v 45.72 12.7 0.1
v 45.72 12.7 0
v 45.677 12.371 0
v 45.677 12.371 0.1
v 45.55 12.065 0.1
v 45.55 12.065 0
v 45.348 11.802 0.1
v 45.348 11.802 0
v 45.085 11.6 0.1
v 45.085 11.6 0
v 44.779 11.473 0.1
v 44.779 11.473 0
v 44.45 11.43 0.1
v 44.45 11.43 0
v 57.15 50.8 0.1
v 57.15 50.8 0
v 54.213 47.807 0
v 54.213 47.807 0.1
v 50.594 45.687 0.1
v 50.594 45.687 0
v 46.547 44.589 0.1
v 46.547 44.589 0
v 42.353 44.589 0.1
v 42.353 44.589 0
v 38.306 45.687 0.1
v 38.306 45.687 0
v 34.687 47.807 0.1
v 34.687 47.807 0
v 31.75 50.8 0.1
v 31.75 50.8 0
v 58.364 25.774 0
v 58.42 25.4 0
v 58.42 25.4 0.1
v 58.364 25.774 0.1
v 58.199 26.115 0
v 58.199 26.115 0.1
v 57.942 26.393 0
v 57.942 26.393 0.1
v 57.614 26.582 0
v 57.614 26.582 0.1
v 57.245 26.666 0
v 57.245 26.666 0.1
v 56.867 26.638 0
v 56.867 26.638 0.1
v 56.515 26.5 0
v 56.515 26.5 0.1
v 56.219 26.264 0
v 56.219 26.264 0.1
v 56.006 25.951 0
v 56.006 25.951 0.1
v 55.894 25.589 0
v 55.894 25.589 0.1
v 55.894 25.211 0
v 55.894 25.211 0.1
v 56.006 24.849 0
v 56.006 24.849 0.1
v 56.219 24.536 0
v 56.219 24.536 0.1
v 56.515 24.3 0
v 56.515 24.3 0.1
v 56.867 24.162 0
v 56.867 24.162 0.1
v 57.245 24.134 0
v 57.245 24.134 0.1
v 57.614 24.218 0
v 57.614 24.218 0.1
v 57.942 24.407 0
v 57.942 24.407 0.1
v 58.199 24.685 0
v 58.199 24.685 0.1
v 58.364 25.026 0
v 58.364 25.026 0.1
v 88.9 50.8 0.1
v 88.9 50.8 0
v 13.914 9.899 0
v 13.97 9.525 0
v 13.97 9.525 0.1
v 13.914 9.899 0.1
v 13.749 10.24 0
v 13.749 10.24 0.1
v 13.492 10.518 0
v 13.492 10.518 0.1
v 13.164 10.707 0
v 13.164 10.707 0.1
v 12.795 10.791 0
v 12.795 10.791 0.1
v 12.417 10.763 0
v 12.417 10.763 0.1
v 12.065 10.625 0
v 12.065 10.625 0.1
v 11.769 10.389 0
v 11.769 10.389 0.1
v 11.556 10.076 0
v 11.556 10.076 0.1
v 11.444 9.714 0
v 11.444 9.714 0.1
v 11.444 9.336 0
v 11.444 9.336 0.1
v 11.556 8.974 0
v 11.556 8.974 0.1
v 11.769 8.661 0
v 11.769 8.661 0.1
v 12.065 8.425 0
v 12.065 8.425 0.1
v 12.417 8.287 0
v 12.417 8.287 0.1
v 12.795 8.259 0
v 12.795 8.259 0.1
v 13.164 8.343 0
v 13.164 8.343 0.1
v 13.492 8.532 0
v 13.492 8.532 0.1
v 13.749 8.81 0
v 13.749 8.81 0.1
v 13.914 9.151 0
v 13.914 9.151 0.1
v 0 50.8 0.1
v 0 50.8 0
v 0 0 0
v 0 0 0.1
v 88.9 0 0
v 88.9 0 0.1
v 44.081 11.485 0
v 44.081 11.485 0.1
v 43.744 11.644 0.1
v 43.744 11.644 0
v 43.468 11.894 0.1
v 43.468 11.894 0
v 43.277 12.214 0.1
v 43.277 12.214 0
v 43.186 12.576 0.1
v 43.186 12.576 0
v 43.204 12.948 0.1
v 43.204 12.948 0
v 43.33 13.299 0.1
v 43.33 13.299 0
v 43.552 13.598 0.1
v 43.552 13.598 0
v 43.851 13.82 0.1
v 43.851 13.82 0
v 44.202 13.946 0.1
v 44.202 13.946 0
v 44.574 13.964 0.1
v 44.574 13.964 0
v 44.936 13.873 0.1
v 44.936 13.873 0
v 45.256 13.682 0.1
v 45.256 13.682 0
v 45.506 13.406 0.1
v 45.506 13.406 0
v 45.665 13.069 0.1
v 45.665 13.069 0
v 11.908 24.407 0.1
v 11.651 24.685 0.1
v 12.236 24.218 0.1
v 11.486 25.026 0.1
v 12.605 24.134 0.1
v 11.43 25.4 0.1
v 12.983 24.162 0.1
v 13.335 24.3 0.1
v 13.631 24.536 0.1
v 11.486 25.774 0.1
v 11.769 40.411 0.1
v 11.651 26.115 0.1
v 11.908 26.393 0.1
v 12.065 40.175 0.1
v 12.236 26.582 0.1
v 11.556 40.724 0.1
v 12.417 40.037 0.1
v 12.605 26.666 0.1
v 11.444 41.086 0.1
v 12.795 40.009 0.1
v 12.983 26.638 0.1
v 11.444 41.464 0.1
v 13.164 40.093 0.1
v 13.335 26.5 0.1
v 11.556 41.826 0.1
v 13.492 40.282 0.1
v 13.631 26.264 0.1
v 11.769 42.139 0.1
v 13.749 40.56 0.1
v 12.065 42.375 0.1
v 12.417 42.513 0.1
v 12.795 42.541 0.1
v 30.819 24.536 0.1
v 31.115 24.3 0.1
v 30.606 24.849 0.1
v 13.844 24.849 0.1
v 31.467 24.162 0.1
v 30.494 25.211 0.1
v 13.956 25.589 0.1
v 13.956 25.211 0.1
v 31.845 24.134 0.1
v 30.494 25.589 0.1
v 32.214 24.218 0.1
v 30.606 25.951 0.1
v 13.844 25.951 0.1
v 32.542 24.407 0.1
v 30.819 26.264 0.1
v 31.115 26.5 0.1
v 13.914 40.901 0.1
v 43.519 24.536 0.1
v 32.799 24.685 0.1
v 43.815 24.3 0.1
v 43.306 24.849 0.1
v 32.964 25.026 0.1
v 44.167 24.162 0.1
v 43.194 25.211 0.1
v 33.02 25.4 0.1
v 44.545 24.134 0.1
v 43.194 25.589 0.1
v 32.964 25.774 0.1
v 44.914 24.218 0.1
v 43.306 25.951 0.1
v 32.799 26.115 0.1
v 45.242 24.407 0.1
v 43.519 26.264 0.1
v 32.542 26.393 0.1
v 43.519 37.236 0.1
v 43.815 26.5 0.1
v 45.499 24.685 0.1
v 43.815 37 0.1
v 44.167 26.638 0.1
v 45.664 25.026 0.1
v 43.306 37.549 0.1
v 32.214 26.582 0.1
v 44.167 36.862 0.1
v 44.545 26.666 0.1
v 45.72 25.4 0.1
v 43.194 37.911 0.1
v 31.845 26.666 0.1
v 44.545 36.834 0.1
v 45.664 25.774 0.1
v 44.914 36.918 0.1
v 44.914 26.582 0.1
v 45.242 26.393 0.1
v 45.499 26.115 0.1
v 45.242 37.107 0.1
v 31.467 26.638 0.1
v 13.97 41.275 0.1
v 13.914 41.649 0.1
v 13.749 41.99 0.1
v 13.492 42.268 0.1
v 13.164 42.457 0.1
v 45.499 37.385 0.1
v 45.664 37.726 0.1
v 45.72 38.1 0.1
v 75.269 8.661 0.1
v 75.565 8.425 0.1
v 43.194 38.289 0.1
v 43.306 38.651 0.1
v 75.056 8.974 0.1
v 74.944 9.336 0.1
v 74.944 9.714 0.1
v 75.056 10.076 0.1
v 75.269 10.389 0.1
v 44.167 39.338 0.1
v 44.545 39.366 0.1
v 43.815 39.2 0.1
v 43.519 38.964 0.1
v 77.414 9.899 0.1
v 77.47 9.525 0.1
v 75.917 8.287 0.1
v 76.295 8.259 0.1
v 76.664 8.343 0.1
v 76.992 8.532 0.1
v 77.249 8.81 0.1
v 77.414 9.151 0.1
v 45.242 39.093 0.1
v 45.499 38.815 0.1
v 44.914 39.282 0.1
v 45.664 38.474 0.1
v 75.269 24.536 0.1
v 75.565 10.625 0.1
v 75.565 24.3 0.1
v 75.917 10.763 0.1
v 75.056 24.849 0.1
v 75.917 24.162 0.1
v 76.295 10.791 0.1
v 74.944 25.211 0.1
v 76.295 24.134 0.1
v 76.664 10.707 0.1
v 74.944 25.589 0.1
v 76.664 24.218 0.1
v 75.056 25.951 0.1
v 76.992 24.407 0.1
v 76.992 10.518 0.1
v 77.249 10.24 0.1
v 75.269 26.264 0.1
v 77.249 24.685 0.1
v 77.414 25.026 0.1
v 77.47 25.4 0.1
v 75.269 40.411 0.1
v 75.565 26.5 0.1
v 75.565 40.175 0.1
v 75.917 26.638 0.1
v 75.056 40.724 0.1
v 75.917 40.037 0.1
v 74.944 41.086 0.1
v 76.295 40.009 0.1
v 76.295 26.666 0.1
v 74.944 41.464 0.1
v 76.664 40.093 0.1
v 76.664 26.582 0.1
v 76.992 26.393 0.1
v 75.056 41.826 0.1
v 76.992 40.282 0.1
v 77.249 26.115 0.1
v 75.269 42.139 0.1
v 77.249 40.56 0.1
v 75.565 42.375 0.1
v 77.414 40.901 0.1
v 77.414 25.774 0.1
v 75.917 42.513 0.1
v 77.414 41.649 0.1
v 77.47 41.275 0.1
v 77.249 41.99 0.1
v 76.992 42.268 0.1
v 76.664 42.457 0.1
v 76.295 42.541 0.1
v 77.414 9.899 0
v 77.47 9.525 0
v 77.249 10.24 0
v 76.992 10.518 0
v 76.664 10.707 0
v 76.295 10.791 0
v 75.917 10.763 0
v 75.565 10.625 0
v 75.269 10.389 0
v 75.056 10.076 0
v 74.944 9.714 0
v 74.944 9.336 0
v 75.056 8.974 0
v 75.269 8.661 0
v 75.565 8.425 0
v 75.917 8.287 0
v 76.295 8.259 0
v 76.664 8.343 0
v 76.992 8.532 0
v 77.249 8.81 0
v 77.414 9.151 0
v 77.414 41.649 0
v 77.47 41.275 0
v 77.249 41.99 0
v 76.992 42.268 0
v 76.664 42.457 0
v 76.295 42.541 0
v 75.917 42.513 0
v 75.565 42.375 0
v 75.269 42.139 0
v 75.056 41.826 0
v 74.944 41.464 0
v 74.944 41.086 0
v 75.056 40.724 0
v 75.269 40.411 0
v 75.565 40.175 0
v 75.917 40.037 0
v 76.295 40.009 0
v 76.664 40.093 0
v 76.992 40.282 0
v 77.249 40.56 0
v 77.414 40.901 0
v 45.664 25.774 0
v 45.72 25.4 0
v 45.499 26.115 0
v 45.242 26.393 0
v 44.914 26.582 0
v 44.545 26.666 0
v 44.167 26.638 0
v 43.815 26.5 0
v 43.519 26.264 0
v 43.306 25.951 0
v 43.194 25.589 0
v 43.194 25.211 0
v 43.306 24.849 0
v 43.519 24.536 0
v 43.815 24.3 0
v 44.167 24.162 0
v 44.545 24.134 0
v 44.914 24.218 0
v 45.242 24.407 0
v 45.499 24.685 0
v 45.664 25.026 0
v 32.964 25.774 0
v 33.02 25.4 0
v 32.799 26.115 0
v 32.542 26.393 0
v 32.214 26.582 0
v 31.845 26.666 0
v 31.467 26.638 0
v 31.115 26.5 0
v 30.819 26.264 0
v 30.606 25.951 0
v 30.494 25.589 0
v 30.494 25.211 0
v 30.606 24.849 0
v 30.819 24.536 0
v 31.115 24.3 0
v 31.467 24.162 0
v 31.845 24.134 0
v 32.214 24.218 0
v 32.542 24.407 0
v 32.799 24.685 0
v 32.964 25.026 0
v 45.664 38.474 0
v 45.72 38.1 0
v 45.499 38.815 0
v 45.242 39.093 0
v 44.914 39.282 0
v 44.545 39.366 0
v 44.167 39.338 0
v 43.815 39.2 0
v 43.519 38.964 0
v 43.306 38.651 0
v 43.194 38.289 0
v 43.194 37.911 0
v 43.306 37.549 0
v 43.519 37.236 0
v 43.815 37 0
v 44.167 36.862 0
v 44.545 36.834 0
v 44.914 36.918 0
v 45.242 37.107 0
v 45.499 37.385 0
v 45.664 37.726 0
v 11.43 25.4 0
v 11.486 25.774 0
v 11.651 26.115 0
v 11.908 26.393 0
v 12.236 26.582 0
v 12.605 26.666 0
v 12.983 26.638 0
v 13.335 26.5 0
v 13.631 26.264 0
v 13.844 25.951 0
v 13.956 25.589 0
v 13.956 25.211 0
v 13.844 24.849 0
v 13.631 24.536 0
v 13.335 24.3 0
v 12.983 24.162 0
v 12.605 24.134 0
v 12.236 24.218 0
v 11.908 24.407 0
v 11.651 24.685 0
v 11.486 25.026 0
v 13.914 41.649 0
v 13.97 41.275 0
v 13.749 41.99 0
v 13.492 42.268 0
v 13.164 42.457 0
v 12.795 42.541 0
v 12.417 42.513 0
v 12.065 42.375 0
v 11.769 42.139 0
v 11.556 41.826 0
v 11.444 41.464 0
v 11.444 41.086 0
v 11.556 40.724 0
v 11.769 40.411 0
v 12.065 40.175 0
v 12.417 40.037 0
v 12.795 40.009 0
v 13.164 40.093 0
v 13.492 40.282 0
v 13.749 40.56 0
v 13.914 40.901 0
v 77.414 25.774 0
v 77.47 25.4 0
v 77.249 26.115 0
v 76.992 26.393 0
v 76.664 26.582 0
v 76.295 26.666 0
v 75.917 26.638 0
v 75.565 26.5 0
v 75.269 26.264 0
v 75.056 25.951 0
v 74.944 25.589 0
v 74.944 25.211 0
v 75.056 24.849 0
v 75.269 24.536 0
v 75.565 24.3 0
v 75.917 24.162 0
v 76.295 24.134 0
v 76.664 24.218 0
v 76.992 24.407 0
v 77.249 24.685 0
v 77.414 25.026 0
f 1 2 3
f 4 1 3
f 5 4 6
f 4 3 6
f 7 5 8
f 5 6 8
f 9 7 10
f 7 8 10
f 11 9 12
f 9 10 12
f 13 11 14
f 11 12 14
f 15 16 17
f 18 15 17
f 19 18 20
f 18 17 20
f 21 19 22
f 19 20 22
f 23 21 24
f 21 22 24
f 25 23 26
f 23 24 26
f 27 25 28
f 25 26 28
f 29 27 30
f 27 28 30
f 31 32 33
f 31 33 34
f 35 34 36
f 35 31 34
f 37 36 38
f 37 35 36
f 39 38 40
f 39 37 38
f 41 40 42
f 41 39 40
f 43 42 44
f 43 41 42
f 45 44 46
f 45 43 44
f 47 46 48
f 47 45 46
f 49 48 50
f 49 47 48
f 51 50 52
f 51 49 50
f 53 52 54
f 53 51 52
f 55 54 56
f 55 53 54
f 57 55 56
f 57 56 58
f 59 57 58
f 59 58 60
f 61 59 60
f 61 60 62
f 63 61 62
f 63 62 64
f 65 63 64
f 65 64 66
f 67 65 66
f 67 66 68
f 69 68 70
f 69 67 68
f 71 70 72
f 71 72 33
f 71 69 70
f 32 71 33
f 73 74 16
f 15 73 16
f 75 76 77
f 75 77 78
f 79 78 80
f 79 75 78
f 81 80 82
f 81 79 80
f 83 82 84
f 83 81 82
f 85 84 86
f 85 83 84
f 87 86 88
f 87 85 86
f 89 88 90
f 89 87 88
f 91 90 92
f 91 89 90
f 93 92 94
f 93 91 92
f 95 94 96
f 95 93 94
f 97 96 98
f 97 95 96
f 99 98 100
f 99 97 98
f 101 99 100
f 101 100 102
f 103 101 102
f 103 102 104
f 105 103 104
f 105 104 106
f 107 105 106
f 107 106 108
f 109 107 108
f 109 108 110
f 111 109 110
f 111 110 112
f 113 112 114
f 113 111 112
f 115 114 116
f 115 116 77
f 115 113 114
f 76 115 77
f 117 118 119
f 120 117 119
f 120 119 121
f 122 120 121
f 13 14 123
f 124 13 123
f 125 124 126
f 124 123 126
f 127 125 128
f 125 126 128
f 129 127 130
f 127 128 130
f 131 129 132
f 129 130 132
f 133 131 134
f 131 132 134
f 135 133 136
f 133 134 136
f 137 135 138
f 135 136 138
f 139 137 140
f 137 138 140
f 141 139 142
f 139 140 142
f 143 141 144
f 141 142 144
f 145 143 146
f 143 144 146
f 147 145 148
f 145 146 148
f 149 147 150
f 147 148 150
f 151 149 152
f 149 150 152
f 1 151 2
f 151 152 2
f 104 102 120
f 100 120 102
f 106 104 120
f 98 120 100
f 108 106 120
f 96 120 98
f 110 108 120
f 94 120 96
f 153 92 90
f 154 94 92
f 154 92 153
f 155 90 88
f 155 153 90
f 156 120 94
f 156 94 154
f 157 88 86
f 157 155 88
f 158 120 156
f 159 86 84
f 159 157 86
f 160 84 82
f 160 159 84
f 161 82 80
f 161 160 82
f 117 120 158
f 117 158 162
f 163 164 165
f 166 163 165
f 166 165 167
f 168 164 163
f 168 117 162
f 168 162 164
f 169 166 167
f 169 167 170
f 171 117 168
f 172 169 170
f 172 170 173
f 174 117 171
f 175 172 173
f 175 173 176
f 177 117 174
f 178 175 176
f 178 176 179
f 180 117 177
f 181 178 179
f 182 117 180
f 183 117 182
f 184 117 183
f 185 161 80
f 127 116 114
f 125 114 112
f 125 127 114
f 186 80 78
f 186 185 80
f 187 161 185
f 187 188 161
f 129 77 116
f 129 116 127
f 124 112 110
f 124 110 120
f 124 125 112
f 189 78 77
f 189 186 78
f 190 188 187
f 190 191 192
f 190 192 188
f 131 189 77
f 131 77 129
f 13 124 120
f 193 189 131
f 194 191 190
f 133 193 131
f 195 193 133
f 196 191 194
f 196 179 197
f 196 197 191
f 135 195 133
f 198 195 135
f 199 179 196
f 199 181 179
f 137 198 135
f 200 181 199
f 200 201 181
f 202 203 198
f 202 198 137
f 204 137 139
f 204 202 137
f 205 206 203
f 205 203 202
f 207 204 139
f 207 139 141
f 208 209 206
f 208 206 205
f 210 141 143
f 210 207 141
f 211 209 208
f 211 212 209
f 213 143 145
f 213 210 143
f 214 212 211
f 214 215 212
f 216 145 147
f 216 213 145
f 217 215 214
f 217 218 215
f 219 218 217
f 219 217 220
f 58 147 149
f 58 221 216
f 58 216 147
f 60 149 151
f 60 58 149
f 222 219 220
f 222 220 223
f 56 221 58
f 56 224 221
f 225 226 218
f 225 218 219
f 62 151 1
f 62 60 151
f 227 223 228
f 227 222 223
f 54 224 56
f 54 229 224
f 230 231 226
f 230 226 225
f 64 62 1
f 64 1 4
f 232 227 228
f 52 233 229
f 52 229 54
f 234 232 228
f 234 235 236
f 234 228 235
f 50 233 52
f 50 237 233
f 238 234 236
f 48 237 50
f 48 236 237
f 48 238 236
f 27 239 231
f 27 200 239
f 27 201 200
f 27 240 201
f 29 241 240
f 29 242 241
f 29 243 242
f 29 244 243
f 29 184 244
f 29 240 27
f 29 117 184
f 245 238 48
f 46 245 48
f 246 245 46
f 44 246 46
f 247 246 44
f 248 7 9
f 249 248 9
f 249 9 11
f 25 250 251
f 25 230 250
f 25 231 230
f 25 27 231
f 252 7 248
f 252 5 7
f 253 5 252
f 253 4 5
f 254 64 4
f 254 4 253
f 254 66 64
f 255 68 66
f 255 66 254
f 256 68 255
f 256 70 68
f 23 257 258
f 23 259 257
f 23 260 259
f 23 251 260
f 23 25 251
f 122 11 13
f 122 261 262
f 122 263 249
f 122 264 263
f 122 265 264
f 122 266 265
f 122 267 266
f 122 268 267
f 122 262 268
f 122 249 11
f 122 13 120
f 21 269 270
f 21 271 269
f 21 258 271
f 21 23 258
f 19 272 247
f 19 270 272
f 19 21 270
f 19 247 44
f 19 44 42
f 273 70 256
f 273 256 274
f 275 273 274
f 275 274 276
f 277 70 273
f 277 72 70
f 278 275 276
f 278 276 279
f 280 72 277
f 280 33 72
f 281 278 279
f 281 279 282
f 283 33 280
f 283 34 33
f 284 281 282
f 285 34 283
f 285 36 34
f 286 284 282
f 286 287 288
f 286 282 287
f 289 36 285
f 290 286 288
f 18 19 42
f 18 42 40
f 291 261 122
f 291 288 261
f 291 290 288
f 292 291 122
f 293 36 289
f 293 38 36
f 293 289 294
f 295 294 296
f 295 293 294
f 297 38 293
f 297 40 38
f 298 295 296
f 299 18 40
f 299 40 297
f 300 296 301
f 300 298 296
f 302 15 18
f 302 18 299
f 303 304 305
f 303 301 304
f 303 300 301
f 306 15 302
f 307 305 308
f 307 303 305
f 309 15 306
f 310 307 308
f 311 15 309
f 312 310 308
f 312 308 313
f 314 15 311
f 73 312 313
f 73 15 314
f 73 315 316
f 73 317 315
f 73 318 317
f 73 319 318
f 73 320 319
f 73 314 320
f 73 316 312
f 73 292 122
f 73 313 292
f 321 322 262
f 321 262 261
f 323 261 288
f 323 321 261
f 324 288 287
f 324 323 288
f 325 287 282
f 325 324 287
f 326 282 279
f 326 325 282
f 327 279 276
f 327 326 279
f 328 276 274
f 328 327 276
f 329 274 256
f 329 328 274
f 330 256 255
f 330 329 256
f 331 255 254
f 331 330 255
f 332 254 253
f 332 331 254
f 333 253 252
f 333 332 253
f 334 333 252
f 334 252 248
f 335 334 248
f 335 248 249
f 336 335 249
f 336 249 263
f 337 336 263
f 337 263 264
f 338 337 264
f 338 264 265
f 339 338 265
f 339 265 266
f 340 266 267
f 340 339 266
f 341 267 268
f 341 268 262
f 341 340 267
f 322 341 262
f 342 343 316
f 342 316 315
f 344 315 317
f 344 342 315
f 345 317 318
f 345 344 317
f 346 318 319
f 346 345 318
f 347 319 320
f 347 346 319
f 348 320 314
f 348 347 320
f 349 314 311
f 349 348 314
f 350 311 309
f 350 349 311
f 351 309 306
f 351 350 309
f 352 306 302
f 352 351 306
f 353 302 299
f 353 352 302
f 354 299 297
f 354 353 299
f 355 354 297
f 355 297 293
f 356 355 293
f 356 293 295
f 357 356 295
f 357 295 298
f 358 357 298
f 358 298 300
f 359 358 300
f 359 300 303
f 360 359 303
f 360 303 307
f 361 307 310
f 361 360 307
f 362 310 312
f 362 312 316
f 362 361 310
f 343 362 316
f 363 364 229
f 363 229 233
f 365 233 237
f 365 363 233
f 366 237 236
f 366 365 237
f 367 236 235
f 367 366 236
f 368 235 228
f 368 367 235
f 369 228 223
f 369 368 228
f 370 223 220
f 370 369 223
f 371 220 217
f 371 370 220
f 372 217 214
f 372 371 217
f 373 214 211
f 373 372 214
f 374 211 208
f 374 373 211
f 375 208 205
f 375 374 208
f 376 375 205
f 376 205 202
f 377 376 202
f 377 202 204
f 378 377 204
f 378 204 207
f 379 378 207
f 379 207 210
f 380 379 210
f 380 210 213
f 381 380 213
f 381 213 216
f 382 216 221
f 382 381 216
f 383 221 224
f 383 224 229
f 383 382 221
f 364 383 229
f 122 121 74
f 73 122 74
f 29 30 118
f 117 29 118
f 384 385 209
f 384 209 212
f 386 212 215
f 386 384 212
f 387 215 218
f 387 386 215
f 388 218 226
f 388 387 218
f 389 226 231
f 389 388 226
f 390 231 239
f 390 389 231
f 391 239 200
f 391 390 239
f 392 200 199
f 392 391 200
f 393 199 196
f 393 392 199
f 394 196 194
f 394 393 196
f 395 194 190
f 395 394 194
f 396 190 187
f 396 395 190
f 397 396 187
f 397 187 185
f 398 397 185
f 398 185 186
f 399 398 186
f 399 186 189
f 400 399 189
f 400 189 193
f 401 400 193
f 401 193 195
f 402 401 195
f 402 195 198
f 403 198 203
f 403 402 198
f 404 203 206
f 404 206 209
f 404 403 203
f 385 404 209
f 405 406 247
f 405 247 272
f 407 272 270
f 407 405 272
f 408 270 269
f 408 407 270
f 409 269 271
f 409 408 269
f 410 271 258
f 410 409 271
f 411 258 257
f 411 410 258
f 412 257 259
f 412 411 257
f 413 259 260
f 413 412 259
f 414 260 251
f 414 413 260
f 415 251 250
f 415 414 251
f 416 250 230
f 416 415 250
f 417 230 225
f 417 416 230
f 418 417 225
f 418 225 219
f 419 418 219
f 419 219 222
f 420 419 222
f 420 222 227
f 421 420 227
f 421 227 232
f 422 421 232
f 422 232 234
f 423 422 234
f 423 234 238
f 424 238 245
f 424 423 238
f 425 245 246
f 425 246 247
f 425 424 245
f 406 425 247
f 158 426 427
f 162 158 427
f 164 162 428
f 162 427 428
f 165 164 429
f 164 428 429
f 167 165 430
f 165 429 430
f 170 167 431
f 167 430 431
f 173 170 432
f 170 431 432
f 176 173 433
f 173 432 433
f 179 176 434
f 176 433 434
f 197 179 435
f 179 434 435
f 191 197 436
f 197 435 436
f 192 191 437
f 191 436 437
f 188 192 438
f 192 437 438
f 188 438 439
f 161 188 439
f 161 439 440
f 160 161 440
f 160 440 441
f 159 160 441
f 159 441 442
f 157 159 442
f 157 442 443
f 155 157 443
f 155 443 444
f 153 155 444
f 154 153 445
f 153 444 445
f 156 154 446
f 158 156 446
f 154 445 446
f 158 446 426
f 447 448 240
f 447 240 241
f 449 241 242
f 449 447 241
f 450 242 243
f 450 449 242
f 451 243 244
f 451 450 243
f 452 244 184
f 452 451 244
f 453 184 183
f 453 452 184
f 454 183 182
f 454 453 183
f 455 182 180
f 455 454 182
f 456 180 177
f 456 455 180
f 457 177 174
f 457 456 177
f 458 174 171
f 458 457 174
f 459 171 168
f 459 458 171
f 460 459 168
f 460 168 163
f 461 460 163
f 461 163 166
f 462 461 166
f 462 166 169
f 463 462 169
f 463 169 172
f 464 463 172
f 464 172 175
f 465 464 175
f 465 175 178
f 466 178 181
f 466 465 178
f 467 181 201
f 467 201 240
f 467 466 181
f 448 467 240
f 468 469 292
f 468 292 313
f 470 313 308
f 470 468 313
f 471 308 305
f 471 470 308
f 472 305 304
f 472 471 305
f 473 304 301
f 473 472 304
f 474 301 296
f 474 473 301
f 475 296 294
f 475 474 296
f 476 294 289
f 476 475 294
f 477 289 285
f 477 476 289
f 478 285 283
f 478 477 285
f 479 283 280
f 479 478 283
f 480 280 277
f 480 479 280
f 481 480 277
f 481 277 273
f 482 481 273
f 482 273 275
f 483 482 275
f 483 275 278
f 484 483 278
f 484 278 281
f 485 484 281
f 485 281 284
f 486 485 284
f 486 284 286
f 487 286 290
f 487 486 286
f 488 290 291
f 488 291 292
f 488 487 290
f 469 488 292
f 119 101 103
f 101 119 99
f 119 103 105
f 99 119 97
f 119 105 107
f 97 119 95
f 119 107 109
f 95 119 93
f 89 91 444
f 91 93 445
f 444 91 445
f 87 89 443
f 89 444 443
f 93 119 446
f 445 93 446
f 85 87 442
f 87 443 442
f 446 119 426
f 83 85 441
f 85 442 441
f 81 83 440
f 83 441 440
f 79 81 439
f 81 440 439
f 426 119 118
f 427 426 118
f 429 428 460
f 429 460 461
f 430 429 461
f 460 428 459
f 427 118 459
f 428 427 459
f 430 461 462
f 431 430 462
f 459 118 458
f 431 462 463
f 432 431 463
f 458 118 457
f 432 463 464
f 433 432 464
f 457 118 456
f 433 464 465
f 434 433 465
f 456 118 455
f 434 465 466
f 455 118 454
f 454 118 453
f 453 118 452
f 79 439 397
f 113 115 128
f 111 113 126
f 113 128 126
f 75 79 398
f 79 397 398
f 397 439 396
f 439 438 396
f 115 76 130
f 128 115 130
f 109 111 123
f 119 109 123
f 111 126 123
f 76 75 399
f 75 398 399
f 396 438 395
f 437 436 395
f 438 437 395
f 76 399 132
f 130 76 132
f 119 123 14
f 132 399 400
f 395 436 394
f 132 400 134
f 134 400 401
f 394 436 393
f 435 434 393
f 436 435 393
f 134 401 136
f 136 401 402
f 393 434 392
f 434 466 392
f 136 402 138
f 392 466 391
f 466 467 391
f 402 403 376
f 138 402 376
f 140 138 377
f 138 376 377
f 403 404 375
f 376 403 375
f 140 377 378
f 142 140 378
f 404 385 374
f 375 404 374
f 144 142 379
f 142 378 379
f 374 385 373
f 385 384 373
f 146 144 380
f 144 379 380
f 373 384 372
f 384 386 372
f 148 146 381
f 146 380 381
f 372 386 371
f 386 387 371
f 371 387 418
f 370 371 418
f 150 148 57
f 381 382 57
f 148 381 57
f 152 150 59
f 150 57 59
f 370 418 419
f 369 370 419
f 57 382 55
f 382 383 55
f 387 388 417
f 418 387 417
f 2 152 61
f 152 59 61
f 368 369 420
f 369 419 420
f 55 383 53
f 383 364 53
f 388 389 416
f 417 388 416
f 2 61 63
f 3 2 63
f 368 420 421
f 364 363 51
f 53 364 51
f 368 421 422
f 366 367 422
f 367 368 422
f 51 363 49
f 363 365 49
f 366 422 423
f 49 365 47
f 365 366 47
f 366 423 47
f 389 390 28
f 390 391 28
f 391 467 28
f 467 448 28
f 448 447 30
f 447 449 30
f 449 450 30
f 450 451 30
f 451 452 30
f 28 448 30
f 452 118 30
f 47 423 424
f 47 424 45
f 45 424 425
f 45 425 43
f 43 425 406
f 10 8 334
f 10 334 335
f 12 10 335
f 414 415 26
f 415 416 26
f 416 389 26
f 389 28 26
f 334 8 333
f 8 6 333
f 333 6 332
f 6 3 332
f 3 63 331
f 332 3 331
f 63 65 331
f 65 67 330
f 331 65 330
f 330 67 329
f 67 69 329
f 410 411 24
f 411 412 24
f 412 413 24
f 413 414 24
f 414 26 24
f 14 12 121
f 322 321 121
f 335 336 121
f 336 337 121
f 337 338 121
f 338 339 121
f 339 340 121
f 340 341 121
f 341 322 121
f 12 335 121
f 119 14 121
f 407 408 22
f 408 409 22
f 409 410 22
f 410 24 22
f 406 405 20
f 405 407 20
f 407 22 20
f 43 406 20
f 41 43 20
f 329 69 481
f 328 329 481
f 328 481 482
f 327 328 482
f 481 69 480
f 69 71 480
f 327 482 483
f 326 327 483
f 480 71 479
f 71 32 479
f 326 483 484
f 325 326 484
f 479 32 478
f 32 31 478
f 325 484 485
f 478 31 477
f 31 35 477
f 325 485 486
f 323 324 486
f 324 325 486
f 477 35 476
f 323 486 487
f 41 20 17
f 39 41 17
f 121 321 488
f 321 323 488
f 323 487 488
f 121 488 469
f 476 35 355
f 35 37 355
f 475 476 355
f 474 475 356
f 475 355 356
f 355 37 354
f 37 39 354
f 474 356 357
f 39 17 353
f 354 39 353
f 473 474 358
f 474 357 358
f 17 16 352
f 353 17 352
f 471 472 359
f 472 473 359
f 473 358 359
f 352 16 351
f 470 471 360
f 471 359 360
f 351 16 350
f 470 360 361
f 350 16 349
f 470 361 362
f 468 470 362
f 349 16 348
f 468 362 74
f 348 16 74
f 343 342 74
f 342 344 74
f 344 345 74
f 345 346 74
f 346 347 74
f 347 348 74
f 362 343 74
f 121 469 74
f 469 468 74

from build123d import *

# Parameters (mm, degrees)
F0_R     = 1.27
F1_DEPTH = 0.1


with BuildPart() as f1:
    # F0 (on Top) → F1 (new body)
    with BuildSketch(Plane.XY):
        with BuildLine():
            Line((0, 25.4), (0, 0))
            Line((0, 0), (44.45, 0))
            Line((44.45, 0), (88.9, 0))
            Line((88.9, 0), (88.9, 50.8))
            Line((88.9, 50.8), (57.15, 50.8))
            ThreePointArc((57.15, 50.8), (44.45, 44.45), (31.75, 50.8))
            Line((31.75, 50.8), (0, 50.8))
            Line((0, 50.8), (0, 25.4))
        make_face()
        with Locations((12.7, 9.525)):
            Circle(F0_R, mode=Mode.SUBTRACT)
        with BuildLine():
            ThreePointArc((13.97, 25.4), (12.7, 24.13), (11.43, 25.4))
            ThreePointArc((11.43, 25.4), (12.7, 26.67), (13.97, 25.4))
        make_face(mode=Mode.SUBTRACT)
        with Locations((31.75, 25.4)):
            Circle(F0_R, mode=Mode.SUBTRACT)
        with BuildLine():
            ThreePointArc((45.72, 12.7), (45.348026, 11.801974), (44.45, 11.43))
            ThreePointArc((44.45, 11.43), (43.551974, 13.598026), (45.72, 12.7))
        make_face(mode=Mode.SUBTRACT)
        with Locations((76.2, 9.525)):
            Circle(F0_R, mode=Mode.SUBTRACT)
        with Locations((44.45, 25.4)):
            Circle(F0_R, mode=Mode.SUBTRACT)
        with Locations((57.15, 25.4)):
            Circle(F0_R, mode=Mode.SUBTRACT)
        with Locations((76.2, 25.4)):
            Circle(F0_R, mode=Mode.SUBTRACT)
        with Locations((12.7, 41.275)):
            Circle(F0_R, mode=Mode.SUBTRACT)
        with Locations((44.45, 38.1)):
            Circle(F0_R, mode=Mode.SUBTRACT)
        with Locations((76.2, 41.275)):
            Circle(F0_R, mode=Mode.SUBTRACT)
    extrude(amount=F1_DEPTH)


solid = f1.part
